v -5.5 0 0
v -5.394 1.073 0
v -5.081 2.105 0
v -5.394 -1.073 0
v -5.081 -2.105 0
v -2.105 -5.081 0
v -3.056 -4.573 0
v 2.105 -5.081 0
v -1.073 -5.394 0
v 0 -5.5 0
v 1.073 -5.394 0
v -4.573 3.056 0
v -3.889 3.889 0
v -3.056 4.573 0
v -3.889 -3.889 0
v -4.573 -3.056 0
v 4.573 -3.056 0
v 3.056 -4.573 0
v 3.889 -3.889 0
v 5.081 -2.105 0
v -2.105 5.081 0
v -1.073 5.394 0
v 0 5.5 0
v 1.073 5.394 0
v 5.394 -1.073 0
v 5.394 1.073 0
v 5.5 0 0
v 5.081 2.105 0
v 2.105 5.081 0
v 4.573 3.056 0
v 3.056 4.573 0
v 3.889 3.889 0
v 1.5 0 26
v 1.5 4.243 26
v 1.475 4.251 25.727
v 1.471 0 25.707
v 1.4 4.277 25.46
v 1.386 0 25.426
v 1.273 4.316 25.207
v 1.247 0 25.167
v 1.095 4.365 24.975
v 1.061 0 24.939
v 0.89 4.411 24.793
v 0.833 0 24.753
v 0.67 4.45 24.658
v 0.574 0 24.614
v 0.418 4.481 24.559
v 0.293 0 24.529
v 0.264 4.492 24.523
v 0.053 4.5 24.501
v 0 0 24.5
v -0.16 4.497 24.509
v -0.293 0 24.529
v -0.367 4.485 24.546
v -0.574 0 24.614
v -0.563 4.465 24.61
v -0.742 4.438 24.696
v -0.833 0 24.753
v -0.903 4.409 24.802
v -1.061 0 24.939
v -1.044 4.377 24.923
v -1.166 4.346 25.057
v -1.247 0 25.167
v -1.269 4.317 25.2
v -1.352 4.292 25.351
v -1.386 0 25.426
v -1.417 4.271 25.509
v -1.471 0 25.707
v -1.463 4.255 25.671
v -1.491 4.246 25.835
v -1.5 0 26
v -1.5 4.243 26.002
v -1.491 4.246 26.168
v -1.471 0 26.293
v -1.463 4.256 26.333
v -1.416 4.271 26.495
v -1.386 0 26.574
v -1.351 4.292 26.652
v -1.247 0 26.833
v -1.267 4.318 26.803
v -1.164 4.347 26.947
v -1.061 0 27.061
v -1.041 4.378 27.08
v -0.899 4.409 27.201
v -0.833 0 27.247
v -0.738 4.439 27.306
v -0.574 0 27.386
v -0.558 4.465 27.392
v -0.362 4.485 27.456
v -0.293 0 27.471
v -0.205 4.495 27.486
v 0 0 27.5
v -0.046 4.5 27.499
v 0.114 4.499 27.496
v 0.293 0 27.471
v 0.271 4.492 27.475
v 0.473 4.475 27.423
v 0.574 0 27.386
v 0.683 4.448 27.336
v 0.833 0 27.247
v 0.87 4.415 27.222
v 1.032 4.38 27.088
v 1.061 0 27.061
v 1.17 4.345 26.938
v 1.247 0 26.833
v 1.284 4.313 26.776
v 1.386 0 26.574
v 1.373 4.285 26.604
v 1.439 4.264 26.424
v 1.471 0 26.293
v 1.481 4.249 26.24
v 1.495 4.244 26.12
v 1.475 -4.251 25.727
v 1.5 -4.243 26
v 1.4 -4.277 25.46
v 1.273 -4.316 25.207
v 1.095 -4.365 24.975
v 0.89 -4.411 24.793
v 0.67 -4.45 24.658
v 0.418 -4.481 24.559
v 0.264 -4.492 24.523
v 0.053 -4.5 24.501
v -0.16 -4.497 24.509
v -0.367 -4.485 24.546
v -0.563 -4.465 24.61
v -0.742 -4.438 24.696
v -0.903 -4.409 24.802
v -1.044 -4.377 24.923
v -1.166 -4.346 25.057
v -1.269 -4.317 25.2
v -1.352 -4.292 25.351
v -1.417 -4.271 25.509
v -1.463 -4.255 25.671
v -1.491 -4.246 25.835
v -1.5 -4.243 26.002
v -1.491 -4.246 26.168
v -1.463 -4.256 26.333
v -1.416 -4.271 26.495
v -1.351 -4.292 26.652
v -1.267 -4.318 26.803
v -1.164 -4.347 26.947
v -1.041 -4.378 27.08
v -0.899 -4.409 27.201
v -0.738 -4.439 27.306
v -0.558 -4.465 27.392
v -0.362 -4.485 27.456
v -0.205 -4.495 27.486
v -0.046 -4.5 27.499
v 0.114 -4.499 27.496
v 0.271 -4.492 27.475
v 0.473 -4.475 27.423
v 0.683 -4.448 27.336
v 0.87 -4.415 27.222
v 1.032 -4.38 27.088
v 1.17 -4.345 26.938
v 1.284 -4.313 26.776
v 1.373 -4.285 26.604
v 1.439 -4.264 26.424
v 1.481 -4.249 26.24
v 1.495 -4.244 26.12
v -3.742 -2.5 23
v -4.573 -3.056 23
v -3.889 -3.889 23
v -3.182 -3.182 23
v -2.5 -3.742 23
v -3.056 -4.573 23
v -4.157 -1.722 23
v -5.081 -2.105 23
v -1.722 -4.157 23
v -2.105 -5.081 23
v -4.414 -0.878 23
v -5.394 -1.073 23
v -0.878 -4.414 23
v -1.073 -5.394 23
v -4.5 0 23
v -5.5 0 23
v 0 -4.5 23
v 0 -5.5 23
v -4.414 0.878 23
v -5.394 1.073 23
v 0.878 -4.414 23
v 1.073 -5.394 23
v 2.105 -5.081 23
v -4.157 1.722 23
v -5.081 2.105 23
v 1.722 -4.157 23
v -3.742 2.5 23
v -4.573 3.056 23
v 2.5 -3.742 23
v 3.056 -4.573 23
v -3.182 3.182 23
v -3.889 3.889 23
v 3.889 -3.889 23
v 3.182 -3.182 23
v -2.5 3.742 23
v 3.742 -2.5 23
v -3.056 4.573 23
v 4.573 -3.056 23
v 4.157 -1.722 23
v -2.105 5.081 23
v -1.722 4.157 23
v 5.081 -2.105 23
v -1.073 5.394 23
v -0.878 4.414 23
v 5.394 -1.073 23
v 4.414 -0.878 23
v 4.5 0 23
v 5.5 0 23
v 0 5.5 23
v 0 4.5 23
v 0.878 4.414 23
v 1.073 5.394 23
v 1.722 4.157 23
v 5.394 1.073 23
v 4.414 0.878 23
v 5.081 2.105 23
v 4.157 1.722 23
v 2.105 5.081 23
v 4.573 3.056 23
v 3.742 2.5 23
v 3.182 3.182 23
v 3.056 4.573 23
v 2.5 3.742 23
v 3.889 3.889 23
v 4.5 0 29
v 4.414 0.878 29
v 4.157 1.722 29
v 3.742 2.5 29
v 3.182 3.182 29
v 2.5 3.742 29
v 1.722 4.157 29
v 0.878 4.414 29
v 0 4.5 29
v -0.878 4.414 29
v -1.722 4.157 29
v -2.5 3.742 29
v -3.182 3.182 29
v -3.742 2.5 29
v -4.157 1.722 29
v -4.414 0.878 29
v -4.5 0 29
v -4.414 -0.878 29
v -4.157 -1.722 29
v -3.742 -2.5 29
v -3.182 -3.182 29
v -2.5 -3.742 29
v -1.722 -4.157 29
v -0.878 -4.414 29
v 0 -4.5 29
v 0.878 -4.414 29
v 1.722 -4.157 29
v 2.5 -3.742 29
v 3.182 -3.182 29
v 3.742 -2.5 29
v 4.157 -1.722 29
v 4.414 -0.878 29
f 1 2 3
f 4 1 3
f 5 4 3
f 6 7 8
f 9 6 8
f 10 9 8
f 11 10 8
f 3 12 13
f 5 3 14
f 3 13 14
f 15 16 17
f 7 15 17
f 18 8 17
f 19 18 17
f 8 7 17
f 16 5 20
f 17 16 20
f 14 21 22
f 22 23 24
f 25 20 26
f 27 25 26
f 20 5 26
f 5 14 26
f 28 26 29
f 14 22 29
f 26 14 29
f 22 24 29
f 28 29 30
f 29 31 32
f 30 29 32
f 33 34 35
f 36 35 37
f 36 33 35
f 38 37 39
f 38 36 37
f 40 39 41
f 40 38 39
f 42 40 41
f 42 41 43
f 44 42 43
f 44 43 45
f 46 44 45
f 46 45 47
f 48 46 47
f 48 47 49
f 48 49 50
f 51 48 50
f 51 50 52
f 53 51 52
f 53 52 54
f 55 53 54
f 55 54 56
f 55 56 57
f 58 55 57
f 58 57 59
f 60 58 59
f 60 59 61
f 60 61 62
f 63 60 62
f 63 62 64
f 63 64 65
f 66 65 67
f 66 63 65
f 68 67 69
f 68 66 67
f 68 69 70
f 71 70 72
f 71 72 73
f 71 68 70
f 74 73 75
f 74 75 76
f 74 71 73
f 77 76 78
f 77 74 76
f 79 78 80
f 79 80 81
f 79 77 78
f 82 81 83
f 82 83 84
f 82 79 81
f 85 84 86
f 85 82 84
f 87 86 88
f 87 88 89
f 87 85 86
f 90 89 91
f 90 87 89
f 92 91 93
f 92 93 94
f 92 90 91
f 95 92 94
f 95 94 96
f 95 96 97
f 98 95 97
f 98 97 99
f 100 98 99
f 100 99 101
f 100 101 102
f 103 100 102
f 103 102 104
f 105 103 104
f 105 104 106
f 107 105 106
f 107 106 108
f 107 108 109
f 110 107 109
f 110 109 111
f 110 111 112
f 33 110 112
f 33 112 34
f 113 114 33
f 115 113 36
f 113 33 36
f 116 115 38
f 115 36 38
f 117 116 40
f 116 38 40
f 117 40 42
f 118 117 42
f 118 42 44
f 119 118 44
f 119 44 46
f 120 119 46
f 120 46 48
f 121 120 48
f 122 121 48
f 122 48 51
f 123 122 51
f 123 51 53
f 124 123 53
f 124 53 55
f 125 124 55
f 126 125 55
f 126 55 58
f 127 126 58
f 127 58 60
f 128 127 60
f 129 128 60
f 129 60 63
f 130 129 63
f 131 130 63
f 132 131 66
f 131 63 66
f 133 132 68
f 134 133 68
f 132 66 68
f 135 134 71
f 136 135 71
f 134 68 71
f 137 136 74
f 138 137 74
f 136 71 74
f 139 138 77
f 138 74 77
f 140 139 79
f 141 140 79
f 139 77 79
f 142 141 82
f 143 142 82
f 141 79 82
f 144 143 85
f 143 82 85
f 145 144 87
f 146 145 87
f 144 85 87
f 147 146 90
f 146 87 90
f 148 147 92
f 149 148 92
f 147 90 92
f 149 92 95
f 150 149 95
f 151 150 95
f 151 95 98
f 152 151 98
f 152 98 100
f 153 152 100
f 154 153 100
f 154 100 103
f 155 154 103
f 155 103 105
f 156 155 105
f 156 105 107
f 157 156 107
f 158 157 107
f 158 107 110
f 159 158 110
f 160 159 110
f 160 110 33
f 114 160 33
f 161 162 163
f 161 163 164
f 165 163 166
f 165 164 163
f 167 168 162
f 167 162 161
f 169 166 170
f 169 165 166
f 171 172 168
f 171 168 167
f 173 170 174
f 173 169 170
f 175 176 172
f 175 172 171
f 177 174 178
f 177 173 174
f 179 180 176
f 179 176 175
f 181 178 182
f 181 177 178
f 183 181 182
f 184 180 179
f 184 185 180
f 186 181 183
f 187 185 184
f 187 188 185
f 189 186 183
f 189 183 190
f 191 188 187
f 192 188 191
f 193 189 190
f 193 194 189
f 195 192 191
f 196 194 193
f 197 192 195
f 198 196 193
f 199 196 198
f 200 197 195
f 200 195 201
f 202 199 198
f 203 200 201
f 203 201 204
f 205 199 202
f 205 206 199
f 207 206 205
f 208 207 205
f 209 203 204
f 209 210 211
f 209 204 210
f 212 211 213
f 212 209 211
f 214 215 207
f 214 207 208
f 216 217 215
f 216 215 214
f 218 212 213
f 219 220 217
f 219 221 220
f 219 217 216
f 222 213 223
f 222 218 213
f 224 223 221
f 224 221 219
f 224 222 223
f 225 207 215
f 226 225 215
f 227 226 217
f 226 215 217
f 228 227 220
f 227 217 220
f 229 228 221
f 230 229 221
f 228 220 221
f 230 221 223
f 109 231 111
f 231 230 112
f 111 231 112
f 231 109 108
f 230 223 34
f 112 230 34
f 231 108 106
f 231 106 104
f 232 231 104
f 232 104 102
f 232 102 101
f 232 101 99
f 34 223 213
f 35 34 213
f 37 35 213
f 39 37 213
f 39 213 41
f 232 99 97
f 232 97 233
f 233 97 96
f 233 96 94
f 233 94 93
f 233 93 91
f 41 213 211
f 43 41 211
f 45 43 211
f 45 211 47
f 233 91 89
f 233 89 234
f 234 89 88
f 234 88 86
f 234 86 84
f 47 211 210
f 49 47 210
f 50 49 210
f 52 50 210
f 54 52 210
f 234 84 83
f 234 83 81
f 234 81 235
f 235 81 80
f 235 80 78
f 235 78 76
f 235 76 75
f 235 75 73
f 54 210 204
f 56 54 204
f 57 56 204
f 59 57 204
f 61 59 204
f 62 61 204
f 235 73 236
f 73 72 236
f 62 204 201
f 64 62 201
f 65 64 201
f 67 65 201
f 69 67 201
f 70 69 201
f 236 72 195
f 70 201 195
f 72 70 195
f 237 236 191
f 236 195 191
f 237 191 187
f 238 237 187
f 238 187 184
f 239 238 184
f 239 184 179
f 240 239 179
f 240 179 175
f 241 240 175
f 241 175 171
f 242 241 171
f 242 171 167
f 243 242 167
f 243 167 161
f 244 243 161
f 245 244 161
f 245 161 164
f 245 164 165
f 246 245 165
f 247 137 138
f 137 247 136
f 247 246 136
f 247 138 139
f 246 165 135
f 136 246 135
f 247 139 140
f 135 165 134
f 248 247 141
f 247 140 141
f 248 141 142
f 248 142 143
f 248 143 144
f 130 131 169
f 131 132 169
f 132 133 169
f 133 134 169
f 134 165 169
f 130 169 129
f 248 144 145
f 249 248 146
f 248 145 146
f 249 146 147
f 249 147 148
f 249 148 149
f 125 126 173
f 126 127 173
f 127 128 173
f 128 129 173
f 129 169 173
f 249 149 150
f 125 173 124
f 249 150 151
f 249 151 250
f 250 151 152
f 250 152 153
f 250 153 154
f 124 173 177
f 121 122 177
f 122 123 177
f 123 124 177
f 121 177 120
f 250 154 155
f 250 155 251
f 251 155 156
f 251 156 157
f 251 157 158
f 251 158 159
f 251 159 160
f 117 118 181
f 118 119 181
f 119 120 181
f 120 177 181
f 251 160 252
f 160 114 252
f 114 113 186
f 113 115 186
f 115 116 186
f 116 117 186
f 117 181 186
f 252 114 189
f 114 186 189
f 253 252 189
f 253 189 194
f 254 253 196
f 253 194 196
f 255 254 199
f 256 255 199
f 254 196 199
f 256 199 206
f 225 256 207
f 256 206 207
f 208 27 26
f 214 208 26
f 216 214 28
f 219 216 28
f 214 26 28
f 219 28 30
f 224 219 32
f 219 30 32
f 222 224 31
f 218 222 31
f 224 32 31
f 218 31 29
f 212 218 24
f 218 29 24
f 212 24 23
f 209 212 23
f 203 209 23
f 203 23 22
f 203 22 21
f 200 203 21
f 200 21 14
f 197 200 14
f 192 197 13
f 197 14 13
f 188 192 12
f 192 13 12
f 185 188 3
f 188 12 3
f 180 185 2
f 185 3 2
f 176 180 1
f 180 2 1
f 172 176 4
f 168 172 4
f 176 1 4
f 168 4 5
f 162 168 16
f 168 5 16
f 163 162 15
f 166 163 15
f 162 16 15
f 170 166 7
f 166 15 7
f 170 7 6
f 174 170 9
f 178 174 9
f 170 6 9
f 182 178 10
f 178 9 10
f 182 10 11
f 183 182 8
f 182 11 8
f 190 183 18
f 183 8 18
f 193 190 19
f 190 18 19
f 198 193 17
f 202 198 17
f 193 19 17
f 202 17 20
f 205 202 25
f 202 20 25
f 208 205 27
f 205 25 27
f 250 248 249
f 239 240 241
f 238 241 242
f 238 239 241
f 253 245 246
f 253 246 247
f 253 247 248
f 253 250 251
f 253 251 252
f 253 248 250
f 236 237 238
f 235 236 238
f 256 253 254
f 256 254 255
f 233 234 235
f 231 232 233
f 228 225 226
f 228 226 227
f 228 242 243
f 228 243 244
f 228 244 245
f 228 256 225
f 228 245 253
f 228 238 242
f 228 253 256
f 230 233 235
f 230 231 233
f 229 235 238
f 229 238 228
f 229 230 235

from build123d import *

# Parameters (mm, degrees)
SKETCH1_R               = 5.5
BOSS_EXTRUDE1_DEPTH     = 23
SKETCH2_R               = 4.5
BOSS_EXTRUDE2_DEPTH     = 6
SKETCH3_R               = 1.5
CUT_EXTRUDE1_DEPTH      = 6.5
CUT_EXTRUDE1_DEPTH_BACK = 6.5


with BuildPart() as part:
    # Sketch1 → Boss-Extrude1 (new body)
    with BuildSketch(Plane.XY):
        Circle(SKETCH1_R)
    extrude(amount=BOSS_EXTRUDE1_DEPTH)

    # Sketch2 → Boss-Extrude2 (add)
    with BuildSketch(Plane.XY.offset(23)):
        Circle(SKETCH2_R)
    extrude(amount=BOSS_EXTRUDE2_DEPTH)

    # Sketch3 → Cut-Extrude1 (cut, two sides)
    with BuildSketch(Plane(origin=(0, 0, 0), x_dir=(1, 0, 0), z_dir=(0, 1, 0))) as cut_extrude1_sk:
        with Locations((0, -26)):
            Circle(SKETCH3_R)
    extrude(amount=CUT_EXTRUDE1_DEPTH, mode=Mode.SUBTRACT)
    extrude(cut_extrude1_sk.sketch, amount=-CUT_EXTRUDE1_DEPTH_BACK, mode=Mode.SUBTRACT)


solid = part.part
